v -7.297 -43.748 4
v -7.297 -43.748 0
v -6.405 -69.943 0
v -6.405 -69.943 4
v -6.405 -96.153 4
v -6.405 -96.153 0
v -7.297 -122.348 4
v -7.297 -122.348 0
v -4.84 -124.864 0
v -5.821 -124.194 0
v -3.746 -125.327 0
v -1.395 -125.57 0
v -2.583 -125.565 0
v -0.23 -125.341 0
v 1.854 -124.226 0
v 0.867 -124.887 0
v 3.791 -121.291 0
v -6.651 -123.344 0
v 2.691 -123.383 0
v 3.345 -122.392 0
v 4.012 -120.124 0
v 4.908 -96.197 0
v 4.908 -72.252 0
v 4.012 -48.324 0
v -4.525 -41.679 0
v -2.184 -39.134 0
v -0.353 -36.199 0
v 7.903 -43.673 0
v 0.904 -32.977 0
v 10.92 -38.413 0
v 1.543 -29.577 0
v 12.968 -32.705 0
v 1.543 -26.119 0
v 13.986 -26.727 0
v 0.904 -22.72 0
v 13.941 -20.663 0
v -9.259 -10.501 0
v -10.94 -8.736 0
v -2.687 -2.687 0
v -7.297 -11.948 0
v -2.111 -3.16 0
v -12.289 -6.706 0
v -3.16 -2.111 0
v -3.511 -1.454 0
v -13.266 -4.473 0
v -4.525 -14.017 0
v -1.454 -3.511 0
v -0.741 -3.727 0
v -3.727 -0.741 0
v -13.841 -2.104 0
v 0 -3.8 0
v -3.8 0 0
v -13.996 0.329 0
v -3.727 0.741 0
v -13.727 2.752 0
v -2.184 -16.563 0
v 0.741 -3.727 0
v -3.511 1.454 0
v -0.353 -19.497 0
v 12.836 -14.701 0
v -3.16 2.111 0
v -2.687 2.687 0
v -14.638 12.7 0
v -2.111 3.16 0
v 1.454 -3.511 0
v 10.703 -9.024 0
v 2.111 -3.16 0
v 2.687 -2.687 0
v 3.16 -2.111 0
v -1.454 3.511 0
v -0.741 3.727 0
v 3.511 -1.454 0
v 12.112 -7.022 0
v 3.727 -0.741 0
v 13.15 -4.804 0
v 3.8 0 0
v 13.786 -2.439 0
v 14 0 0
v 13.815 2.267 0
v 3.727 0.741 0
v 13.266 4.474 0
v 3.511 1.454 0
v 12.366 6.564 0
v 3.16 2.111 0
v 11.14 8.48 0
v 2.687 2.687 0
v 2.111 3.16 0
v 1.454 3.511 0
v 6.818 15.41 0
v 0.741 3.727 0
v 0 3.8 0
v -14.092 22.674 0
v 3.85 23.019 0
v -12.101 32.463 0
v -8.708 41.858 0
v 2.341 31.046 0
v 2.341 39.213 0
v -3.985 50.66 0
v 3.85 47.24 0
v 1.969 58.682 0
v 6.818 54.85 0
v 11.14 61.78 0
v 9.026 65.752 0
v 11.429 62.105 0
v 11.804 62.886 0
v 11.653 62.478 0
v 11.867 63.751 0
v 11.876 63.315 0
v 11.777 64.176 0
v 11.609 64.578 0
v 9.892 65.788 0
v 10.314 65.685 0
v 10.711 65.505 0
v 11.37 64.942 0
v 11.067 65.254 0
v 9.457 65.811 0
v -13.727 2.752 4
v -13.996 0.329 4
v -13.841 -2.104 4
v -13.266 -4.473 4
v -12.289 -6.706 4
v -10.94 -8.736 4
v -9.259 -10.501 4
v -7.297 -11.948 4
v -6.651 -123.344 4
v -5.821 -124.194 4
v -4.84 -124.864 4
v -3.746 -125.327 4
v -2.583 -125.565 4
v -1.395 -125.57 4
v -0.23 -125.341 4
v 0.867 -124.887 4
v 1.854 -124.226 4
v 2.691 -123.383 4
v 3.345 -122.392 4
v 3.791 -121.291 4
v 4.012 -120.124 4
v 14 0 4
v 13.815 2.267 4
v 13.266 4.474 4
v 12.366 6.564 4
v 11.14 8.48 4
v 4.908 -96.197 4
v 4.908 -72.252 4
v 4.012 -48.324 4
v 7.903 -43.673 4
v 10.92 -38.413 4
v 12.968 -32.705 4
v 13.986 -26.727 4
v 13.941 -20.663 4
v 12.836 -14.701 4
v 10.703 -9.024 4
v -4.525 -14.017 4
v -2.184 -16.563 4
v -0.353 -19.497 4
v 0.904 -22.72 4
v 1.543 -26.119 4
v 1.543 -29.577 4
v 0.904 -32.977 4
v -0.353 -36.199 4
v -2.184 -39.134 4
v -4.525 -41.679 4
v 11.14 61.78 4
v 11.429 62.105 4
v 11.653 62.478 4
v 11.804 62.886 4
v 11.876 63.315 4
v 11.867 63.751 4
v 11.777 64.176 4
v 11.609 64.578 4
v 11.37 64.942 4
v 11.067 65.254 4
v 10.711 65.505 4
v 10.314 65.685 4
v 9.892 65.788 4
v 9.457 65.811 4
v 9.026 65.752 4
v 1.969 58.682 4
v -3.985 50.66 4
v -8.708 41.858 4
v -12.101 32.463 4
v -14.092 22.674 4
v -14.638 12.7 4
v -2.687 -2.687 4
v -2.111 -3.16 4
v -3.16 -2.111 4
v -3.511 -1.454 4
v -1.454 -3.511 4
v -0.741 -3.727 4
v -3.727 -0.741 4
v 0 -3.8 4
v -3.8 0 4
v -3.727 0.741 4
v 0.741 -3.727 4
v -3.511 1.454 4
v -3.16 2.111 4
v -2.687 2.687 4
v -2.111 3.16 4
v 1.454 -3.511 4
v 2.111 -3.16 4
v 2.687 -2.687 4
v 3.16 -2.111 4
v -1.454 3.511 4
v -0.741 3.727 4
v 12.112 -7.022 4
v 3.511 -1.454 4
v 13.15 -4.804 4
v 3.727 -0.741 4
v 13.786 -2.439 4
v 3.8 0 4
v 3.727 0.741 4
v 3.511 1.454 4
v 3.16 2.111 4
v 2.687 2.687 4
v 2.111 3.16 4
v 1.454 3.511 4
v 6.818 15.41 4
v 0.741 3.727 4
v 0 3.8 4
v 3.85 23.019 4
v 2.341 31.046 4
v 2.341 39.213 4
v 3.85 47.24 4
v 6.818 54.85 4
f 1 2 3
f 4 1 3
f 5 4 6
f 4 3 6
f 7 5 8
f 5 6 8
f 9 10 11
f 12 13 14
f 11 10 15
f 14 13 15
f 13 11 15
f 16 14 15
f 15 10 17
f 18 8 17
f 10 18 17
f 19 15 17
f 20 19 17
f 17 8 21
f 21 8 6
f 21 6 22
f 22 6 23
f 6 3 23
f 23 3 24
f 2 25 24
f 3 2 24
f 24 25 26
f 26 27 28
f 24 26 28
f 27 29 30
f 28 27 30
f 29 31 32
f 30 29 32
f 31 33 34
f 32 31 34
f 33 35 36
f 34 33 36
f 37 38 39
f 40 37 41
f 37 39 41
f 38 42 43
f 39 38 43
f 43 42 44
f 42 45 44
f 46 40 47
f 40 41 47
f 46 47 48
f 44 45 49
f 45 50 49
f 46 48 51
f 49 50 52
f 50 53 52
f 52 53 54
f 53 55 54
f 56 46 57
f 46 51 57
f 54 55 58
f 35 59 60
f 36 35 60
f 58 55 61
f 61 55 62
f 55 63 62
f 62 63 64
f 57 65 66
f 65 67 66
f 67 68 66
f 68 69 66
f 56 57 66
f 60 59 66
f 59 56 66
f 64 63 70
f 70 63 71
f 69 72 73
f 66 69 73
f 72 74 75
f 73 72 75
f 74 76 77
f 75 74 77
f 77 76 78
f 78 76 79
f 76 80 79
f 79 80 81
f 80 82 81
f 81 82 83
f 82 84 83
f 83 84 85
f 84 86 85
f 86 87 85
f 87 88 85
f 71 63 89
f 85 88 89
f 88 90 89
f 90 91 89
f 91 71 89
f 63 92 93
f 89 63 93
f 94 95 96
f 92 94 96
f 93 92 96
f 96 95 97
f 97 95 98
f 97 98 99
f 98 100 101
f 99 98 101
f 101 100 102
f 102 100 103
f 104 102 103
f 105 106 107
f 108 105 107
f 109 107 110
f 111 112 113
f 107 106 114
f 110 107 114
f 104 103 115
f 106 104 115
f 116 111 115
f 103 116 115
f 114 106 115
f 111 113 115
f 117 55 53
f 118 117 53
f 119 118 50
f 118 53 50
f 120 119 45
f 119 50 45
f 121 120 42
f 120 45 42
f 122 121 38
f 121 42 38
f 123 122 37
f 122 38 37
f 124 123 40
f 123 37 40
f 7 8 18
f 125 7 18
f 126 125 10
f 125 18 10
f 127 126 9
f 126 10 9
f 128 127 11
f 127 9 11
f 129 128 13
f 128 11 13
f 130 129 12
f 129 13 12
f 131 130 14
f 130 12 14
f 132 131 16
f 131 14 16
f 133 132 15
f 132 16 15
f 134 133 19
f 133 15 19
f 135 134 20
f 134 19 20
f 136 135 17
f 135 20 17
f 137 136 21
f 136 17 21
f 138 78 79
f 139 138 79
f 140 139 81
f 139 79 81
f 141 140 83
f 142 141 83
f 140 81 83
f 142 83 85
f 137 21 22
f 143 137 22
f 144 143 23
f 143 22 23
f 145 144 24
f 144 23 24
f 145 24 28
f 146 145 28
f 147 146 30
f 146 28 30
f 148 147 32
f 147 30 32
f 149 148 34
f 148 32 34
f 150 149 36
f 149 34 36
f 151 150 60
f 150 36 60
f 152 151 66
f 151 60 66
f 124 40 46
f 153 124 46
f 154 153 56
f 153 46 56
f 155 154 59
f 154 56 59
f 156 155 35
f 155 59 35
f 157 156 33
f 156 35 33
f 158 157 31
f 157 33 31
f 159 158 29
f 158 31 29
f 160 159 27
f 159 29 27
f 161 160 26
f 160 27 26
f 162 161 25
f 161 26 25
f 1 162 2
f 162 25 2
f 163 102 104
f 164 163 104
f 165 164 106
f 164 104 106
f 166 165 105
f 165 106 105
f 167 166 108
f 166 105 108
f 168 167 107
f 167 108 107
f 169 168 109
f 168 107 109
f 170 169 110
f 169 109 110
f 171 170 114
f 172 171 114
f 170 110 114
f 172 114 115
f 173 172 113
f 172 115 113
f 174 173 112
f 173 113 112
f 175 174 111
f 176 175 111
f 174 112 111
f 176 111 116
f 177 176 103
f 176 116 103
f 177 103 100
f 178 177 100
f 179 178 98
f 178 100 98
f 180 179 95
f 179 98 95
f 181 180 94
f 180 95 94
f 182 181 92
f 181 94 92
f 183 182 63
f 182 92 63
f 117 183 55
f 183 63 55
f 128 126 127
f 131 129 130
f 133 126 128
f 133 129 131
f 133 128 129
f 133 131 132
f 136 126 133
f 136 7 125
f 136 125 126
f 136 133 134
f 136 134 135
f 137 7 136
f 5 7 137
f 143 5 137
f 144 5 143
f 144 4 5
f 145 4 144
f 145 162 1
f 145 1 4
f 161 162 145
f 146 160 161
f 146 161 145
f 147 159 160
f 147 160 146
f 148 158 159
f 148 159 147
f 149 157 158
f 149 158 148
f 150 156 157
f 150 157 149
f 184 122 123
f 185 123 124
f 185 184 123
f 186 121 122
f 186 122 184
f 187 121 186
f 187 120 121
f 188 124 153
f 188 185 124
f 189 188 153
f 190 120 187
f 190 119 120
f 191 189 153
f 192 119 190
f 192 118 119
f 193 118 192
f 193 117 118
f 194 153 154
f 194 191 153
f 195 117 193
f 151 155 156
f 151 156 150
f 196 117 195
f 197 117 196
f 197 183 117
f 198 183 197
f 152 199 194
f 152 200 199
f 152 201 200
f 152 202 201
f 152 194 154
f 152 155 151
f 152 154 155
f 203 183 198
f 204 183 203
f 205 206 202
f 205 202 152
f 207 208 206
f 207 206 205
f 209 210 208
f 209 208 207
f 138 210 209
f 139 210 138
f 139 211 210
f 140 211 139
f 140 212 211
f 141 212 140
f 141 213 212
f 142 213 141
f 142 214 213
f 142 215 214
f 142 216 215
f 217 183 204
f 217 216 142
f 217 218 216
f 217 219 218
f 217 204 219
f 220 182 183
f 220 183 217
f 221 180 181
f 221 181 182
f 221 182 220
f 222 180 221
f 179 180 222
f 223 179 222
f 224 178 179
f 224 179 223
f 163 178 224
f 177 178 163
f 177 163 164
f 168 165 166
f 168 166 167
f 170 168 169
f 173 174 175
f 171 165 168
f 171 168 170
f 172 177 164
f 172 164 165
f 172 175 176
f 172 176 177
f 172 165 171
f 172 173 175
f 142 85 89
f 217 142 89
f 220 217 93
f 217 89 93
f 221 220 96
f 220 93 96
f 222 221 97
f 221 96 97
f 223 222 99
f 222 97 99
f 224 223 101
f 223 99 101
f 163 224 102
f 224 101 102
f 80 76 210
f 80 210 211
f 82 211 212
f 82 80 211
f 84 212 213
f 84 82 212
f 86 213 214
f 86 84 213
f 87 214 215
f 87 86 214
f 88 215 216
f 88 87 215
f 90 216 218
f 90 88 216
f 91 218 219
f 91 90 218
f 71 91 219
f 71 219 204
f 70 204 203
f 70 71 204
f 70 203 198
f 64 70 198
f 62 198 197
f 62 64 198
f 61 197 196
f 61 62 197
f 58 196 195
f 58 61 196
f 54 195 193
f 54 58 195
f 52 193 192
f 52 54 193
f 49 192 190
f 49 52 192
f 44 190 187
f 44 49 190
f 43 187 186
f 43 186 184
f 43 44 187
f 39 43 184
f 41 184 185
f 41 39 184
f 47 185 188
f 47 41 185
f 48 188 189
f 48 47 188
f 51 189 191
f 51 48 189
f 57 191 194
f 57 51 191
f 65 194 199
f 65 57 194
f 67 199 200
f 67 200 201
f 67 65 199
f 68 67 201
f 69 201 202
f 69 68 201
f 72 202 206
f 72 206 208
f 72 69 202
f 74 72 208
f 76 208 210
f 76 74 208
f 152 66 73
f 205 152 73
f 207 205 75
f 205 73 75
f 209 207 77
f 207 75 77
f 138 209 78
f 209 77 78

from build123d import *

# Parameters (mm, degrees)
F0_R     = 3.8
F1_DEPTH = 4


# Not quite as in the source:
# - a feature names something its author has since deleted; it is built from what else it names


with BuildPart() as f1:
    # F0 (on Top) → F1 (new body)
    with BuildSketch(Plane.XY):
        with BuildLine():
            ThreePointArc((10.7032142857, -9.0244780433), (13.15, -4.8039046618), (14, 0))
            ThreePointArc((14, 0), (13.2657182303, 4.4744519031), (11.1398971667, 8.4795454545))
            ThreePointArc((11.1398971667, 8.4795454545), (-3.1423826746, 13.6427794502), (-13.7268716756, 2.7519073388))
            ThreePointArc((-13.7268716756, 2.7519073388), (-12.8265756347, -5.610611151), (-7.2967857143, -11.9480926612))
            ThreePointArc((-7.2967857143, -11.9480926612), (-3.7899012351, -13.4772641374), (0, -14))
            ThreePointArc((0, -14), (5.90158061, -12.6953277352), (10.7032142857, -9.0244780433))
        make_face()
        Circle(F0_R, mode=Mode.SUBTRACT)
        with BuildLine():
            ThreePointArc((4.0123564651, -48.3244780433), (13.6087273384, -29.7387061328), (10.7032142857, -9.0244780433))
            ThreePointArc((10.7032142857, -9.0244780433), (5.90158061, -12.6953277352), (0, -14))
            ThreePointArc((0, -14), (-3.7899012351, -13.4772641374), (-7.2967857143, -11.9480926612))
            ThreePointArc((-7.2967857143, -11.9480926612), (1.6235591613, -27.8480926612), (-7.2967857143, -43.7480926612))
            ThreePointArc((-7.2967857143, -43.7480926612), (-6.2932161351, -83.0480926612), (-7.2967857143, -122.3480926612))
            ThreePointArc((-7.2967857143, -122.3480926612), (-0.8068871669, -125.4847000324), (4.0123564651, -120.1244780433))
            ThreePointArc((4.0123564651, -120.1244780433), (5.0200325676, -84.2244780433), (4.0123564651, -48.3244780433))
        make_face()
        with BuildLine():
            ThreePointArc((-13.7268716756, 2.7519073388), (-3.1423826746, 13.6427794502), (11.1398971667, 8.4795454545))
            ThreePointArc((11.1398971667, 8.4795454545), (2.1510025477, 35.1295454545), (11.1398971667, 61.7795454545))
            ThreePointArc((11.1398971667, 61.7795454545), (11.6091204752, 64.5781543581), (9.0255790591, 65.7519073388))
            ThreePointArc((9.0255790591, 65.7519073388), (-10.5763059667, 37.2226044204), (-13.7268716756, 2.7519073388))
        make_face()
    extrude(amount=F1_DEPTH)


solid = f1.part
